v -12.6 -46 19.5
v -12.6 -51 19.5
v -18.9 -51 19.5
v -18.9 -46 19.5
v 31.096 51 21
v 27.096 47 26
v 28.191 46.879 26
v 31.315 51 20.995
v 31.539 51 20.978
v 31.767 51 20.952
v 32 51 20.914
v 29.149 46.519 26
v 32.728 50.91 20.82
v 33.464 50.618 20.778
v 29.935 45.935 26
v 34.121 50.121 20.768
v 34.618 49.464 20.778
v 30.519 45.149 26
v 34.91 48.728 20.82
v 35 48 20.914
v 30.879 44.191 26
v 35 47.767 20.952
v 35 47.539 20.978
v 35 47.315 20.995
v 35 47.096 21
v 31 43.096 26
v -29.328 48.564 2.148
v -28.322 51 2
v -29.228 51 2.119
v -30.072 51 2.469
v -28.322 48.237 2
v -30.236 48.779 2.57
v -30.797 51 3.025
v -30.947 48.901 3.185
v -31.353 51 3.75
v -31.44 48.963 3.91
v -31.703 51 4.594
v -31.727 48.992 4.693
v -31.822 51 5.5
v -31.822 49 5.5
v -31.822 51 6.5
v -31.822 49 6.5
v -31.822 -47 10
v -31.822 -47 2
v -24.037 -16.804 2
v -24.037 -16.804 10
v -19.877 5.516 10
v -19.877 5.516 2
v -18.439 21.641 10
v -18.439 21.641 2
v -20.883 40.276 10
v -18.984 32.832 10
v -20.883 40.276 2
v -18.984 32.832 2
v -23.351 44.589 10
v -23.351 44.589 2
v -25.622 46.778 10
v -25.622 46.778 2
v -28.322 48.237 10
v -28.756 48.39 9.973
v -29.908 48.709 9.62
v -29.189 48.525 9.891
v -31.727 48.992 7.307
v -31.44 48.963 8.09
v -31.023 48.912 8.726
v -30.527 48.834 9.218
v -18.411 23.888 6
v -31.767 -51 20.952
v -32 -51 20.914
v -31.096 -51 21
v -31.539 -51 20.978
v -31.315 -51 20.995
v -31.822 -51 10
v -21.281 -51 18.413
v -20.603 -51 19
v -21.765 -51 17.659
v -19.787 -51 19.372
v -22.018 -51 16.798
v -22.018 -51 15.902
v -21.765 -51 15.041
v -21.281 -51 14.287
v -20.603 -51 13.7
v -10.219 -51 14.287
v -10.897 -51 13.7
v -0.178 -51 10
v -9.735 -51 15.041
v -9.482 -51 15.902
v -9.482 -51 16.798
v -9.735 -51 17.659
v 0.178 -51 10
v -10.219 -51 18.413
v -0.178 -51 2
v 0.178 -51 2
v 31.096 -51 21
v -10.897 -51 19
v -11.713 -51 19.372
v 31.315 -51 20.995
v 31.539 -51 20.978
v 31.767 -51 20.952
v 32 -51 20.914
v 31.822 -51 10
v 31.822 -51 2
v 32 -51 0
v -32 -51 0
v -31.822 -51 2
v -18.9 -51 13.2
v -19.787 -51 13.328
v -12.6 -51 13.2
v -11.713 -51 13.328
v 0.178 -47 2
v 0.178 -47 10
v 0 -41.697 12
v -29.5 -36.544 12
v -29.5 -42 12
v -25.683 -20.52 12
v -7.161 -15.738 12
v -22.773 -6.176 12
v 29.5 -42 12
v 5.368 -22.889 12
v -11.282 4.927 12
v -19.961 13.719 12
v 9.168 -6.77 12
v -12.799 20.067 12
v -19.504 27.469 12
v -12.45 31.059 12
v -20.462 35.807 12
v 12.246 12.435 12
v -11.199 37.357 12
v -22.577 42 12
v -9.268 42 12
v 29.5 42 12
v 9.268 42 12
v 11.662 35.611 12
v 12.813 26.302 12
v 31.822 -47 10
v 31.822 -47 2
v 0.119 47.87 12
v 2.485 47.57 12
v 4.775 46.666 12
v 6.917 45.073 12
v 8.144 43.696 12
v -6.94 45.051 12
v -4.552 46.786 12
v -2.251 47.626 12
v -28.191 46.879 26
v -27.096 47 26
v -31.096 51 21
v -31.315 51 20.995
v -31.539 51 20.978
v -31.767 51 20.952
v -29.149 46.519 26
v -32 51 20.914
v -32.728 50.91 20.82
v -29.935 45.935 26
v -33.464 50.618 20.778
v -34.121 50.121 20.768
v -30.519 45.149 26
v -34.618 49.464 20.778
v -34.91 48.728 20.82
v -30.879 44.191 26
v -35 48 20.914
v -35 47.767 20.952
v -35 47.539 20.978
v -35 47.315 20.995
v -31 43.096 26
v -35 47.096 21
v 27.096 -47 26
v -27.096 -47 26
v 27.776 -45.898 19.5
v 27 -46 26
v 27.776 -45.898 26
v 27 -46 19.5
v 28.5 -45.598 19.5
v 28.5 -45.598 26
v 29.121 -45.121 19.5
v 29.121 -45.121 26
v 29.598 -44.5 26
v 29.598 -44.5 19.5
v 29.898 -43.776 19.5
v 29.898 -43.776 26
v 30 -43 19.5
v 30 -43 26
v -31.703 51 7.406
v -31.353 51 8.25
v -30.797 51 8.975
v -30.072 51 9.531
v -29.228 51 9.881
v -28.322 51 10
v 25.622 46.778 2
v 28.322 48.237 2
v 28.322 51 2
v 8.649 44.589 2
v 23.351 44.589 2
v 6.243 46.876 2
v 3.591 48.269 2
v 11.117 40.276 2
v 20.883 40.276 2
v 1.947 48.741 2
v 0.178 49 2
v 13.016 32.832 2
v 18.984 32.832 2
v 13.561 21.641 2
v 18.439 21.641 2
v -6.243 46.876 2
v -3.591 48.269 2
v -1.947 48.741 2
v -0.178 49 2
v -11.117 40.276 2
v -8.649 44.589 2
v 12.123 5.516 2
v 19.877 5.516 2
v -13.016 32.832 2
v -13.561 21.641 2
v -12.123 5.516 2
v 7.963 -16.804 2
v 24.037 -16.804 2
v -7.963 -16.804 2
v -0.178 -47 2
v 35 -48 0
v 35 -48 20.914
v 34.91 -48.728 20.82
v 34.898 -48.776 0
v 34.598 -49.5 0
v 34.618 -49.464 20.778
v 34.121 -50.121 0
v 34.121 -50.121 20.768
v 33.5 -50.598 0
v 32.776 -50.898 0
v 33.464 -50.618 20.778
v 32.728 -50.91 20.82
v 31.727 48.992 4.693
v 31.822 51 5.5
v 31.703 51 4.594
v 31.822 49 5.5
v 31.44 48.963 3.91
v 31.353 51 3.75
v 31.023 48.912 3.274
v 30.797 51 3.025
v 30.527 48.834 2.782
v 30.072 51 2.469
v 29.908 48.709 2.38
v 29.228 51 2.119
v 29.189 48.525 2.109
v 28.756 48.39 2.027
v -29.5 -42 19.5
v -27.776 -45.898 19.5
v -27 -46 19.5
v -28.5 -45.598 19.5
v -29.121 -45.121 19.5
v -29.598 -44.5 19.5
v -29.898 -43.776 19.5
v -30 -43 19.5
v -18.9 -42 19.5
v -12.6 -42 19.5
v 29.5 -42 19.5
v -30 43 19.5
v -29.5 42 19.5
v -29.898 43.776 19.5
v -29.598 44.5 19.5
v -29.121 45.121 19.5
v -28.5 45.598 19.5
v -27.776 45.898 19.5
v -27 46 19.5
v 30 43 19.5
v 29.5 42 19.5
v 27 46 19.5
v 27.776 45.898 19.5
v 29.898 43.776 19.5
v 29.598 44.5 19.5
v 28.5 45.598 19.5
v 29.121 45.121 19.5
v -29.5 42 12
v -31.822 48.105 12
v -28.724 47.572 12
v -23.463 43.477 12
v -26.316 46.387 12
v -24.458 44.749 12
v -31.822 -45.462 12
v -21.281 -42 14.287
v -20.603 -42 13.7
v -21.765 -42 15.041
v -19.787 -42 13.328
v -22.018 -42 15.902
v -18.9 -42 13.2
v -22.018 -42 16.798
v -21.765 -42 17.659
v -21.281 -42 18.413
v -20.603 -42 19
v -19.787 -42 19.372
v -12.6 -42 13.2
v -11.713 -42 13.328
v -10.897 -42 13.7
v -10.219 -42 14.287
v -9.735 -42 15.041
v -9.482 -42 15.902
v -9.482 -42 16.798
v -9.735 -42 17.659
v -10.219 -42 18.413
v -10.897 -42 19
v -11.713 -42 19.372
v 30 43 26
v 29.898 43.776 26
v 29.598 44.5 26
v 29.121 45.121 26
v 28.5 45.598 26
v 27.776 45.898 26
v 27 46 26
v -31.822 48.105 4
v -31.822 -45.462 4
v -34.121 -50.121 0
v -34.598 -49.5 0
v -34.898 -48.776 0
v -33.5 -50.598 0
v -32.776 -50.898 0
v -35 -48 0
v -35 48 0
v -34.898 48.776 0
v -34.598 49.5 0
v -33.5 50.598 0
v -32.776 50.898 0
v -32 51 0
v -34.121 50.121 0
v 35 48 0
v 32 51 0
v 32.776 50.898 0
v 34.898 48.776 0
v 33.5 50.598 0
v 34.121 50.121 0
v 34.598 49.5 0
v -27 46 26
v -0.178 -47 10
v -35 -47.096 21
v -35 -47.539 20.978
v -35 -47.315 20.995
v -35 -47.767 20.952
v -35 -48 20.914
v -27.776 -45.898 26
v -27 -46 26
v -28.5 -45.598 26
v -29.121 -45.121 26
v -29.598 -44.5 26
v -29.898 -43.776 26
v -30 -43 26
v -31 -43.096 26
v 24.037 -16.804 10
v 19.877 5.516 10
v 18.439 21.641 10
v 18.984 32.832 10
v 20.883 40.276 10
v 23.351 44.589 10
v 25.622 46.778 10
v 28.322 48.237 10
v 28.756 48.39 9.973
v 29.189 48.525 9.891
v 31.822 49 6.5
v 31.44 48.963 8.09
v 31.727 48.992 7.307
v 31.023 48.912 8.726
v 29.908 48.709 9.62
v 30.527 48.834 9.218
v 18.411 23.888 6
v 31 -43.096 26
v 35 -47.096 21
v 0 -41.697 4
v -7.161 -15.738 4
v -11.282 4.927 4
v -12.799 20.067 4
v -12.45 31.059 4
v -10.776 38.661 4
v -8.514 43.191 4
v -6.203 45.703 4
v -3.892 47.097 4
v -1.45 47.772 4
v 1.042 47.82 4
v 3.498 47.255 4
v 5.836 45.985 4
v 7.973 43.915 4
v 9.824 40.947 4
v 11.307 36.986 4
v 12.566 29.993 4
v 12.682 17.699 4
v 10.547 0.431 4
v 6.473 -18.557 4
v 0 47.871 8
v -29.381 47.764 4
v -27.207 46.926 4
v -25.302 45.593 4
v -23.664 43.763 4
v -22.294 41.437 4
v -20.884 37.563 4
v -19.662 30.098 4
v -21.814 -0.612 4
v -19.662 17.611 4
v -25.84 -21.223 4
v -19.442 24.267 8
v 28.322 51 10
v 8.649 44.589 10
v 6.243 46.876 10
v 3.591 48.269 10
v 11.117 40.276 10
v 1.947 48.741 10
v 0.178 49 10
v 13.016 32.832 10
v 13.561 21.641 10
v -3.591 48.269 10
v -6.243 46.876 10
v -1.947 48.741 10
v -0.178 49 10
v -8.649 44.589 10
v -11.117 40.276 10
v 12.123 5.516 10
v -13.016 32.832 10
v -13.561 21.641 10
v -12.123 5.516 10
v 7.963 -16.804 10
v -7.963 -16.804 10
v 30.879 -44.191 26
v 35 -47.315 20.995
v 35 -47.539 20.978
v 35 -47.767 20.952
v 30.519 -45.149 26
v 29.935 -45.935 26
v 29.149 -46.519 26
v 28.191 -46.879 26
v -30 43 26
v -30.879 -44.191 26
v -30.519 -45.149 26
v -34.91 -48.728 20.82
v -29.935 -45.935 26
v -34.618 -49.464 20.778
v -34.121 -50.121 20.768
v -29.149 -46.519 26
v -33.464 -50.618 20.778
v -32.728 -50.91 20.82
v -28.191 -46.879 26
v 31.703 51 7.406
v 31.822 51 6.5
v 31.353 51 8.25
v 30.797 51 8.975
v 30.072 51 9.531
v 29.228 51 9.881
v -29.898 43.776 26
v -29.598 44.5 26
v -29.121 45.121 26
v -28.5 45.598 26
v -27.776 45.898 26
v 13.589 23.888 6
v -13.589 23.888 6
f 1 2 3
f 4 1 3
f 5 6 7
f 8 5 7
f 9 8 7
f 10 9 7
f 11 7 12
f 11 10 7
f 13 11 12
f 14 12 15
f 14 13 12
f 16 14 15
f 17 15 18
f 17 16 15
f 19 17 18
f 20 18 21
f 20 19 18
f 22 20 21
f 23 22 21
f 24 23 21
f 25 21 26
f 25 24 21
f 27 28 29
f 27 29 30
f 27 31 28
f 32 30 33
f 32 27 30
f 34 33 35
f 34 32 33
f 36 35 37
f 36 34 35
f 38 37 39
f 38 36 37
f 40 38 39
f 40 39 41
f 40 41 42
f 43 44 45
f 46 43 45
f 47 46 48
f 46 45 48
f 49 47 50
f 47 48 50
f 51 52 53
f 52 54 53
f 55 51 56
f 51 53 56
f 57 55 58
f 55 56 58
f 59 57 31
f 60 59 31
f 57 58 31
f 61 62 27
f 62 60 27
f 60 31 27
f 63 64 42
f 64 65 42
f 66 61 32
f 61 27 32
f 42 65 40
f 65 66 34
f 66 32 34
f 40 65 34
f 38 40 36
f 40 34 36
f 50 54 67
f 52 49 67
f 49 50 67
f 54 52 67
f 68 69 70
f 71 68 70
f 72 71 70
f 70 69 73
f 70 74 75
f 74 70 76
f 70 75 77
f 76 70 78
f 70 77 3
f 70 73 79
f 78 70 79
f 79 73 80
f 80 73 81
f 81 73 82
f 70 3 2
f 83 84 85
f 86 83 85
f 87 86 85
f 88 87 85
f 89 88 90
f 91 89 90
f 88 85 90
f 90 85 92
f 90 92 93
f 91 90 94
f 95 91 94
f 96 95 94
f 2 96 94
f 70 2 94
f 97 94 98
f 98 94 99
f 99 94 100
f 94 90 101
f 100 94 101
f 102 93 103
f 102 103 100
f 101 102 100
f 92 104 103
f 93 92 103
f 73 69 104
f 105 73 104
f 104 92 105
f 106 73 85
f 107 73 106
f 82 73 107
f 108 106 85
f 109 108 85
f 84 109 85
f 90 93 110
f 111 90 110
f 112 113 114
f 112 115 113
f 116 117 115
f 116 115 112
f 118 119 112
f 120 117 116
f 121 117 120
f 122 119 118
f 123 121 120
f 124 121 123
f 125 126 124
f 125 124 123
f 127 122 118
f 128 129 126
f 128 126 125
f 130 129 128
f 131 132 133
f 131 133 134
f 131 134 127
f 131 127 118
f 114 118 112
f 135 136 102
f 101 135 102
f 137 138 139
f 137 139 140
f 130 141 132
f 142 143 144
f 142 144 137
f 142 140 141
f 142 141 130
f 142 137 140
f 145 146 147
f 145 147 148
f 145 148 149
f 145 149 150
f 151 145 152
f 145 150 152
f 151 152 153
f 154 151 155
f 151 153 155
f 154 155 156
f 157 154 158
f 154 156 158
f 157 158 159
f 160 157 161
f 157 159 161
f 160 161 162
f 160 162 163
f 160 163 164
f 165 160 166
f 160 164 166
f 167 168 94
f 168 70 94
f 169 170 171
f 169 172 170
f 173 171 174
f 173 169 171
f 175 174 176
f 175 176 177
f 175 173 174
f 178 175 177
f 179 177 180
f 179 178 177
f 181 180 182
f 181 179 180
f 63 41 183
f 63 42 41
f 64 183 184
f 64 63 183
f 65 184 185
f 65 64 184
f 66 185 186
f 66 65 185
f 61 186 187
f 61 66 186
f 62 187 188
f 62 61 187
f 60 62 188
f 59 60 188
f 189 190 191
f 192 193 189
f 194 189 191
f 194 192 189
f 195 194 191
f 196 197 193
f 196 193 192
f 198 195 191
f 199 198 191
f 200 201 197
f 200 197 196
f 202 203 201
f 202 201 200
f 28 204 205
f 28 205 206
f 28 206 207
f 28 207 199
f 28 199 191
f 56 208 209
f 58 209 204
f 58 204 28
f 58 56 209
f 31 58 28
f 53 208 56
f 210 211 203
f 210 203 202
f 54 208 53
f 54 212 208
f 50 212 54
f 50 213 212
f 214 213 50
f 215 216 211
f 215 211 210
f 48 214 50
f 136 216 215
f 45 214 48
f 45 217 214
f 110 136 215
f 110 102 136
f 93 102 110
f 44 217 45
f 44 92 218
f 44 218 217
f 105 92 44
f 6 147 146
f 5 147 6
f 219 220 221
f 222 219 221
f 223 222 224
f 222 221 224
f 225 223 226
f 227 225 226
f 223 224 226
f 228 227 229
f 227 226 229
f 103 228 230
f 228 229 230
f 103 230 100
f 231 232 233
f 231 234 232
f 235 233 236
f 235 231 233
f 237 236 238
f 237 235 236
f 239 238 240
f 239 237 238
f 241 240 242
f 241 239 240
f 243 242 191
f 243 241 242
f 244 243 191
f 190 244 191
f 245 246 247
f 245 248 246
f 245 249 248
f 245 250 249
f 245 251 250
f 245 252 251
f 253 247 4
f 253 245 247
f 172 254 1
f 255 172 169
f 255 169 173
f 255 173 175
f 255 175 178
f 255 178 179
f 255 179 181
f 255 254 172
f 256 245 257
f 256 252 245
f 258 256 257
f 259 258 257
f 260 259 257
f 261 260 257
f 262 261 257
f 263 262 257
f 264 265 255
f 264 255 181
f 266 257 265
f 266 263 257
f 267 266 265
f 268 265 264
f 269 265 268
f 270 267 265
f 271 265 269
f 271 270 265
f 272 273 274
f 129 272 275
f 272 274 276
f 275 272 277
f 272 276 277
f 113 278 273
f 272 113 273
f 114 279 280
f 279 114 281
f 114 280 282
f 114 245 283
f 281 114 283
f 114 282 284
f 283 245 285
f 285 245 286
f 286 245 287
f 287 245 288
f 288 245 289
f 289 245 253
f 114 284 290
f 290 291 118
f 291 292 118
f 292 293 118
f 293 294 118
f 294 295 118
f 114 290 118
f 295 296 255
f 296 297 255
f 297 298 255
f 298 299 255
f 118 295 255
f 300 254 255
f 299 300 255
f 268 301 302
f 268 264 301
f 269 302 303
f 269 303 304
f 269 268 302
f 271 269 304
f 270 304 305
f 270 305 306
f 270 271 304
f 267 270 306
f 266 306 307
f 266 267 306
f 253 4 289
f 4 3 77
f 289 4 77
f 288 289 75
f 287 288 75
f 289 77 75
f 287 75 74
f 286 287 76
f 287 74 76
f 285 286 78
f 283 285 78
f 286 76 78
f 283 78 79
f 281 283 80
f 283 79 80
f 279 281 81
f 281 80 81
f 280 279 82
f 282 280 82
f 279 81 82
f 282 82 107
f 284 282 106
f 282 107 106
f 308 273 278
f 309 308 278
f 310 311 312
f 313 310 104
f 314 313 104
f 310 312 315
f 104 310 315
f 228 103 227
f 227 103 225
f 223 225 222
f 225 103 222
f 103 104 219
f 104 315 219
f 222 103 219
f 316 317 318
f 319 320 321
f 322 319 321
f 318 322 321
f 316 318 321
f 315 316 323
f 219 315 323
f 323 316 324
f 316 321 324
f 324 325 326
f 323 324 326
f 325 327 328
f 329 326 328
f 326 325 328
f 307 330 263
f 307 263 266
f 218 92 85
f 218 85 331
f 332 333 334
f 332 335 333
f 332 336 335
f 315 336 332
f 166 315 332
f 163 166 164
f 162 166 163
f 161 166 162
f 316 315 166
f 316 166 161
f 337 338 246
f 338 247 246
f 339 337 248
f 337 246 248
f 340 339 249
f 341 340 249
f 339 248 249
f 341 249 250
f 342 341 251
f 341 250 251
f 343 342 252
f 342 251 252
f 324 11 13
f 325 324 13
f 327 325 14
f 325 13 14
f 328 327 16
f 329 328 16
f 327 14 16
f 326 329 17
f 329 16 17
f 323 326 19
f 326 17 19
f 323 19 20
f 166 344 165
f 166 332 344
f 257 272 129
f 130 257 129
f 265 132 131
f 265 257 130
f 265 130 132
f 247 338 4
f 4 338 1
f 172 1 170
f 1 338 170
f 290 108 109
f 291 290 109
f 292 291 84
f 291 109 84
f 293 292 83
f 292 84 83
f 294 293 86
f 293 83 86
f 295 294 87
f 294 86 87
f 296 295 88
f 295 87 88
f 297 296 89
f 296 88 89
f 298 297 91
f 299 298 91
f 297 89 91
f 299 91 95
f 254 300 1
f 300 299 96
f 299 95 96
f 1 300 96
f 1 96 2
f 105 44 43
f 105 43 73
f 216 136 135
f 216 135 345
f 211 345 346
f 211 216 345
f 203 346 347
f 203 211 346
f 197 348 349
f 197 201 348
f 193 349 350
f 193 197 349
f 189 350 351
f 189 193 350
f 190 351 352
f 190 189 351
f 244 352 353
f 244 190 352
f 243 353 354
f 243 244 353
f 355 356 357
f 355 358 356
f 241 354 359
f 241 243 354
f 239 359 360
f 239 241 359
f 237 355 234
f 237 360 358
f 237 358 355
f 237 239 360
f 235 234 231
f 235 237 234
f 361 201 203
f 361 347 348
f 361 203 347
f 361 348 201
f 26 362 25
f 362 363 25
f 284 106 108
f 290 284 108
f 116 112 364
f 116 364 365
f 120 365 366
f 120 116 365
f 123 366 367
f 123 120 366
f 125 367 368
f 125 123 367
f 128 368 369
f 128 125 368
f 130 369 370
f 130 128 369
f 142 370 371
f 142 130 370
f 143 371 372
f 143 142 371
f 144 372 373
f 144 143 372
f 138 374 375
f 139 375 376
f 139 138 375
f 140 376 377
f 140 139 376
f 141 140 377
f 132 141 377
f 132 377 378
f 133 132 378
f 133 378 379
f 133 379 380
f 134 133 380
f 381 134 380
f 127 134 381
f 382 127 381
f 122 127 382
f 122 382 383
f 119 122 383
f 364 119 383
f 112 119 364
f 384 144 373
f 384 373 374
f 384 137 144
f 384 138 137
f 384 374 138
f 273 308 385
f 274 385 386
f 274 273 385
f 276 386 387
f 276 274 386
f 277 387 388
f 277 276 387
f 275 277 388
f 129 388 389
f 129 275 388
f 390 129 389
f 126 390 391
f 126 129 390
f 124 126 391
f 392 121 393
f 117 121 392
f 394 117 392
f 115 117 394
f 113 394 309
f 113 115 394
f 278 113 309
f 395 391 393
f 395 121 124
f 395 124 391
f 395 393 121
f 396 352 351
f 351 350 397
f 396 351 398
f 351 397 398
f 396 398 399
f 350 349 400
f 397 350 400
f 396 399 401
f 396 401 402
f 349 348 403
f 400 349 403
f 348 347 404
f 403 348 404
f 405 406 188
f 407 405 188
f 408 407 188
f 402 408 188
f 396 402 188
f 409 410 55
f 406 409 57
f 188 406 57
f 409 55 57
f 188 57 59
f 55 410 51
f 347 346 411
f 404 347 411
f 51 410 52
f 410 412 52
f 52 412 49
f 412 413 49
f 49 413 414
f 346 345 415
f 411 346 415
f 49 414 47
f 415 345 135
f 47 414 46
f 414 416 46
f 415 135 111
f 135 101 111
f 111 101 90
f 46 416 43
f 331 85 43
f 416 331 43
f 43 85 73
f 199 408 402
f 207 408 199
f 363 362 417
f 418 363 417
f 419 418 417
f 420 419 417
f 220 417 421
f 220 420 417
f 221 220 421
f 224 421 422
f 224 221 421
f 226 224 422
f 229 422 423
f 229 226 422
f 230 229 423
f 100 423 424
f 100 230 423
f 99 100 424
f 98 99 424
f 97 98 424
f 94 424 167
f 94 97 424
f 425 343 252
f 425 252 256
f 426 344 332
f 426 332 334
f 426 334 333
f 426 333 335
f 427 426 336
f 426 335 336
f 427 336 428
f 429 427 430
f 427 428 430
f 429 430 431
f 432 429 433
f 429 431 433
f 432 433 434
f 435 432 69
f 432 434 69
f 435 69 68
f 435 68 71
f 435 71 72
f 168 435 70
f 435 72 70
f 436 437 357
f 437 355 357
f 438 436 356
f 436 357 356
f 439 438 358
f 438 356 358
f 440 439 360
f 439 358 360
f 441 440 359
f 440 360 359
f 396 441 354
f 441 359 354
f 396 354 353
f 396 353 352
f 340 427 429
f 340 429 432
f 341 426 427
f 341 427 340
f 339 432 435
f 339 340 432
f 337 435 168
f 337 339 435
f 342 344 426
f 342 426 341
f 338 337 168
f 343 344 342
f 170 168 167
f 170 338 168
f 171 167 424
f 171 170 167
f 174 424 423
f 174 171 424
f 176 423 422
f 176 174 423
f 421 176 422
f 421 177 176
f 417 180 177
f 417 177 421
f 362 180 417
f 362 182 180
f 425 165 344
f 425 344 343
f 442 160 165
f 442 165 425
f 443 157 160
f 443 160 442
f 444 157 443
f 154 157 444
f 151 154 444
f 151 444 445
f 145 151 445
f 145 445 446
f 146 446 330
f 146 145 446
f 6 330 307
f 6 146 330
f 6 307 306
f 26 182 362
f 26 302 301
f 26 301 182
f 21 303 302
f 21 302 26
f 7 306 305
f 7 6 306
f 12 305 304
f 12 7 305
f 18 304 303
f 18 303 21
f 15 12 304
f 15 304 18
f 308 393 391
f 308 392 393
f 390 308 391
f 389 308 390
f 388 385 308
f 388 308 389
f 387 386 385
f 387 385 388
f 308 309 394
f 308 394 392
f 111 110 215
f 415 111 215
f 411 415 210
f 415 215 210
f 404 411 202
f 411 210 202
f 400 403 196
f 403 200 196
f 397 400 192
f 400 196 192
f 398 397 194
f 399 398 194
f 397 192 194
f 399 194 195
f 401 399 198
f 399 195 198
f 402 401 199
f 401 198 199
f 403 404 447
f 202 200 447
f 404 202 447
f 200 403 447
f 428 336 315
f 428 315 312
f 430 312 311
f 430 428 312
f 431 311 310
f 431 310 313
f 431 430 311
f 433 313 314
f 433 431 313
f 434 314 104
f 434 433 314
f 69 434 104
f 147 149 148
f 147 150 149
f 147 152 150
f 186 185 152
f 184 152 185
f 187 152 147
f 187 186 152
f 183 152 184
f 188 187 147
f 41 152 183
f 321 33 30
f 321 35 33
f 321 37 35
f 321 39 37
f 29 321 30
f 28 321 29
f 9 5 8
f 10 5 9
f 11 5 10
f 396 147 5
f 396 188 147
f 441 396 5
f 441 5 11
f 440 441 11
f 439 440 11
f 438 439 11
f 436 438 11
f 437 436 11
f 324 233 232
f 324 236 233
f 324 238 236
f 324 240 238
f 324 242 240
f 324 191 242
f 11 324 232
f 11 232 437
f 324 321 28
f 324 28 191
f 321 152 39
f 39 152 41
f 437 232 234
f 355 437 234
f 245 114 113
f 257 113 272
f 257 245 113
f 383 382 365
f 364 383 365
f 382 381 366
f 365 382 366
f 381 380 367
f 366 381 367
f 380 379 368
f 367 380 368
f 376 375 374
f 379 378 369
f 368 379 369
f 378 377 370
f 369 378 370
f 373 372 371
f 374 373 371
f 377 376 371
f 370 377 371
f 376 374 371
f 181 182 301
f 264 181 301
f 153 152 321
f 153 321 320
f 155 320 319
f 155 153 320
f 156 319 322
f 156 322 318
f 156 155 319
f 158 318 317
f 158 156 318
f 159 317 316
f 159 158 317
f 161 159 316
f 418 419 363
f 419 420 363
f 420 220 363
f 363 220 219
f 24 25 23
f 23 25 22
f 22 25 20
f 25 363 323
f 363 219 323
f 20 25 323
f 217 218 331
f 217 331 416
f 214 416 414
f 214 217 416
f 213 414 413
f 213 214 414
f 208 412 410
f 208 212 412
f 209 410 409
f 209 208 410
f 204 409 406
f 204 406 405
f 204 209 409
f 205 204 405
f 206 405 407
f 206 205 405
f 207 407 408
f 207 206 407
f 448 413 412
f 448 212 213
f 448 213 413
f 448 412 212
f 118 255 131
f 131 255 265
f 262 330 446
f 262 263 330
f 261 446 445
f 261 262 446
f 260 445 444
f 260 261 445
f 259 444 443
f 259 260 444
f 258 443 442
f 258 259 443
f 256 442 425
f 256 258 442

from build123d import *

# Parameters (mm, degrees)
SKETCH016_W        = 70
SKETCH016_H        = 102
PAD007_DEPTH       = 26
SKETCH017_W        = 60
SKETCH017_H        = 92
POCKET011_DEPTH    = 6.5
FILLET010_R        = 3
SKETCH018_W        = 59
SKETCH018_H        = 84
POCKET012_DEPTH    = 7.5
POCKET013_DEPTH    = 9
POCKET014_DEPTH    = 8
POCKET015_DEPTH    = 8
CHAMFER007_SIZE2   = 5
CHAMFER007_SIZE    = 4
FILLET011_R        = 5
FILLET012_R        = 3
POCKET015_FACE20_W = 2
POCKET015_FACE20_H = 8
POCKET016_DEPTH    = 0.356442
FILLET013_R        = 3.5


with BuildPart() as part:
    # Sketch016 → Pad007 (new body)
    with BuildSketch(Plane.XY):
        Rectangle(SKETCH016_W, SKETCH016_H)
    extrude(amount=PAD007_DEPTH)

    # Sketch017 (on Face6 of Pad007) → Pocket011 (cut)
    with BuildSketch(Plane.XY.offset(26)):
        Rectangle(SKETCH017_W, SKETCH017_H)
    extrude(amount=-POCKET011_DEPTH, mode=Mode.SUBTRACT)

    # Fillet010
    fillet010_edges = [part.edges().sort_by_distance(p)[0] for p in [
        (30, 46, 22.75),
        (-30, 46, 22.75),
        (-30, -46, 22.75),
        (30, -46, 22.75),
    ]]
    fillet(fillet010_edges, radius=FILLET010_R)

    # Sketch018 (on Face11 of Pocket011) → Pocket012 (cut)
    with BuildSketch(Plane.XY.offset(19.5)):
        Rectangle(SKETCH018_W, SKETCH018_H)
    extrude(amount=-POCKET012_DEPTH, mode=Mode.SUBTRACT)

    # Sketch019 (on Face13 of Pocket012) → Pocket013 (cut)
    with BuildSketch(Plane.XZ.offset(51)):
        with BuildLine():
            ThreePointArc((-18.9, 19.5), (-22.05, 16.35), (-18.9, 13.2))
            Line((-18.9, 13.2), (-12.6, 13.2))
            ThreePointArc((-12.6, 13.2), (-9.45, 16.35), (-12.6, 19.5))
            Line((-12.6, 19.5), (-18.9, 19.5))
        make_face()
    extrude(amount=-POCKET013_DEPTH, mode=Mode.SUBTRACT)

    # Sketch020 (on DatumPlane) → Pocket014 (cut)
    with BuildSketch(Plane(origin=(0, 0, 2), x_dir=(1, 0, 0), z_dir=(0, 0, -1))):
        with BuildLine():
            Line((-31.821779, 47), (-31.821779, 51))
            Line((-31.821779, 51), (-0.178221, 51))
            Line((-0.178221, 51), (-0.178221, 47))
            add(Edge.make_bspline(
                [(-0.178221, 47), (-27, -46.775214), (-0.178221, -49)],
                knots=[0, 0, 0, 1, 1, 1], degree=2))
            Line((-0.178221, -49), (-0.178221, -51))
            Line((-0.178221, -51), (-31.821779, -51))
            Line((-31.821779, -51), (-31.821779, -49))
            add(Edge.make_bspline(
                [(-31.821779, 47), (-5, -46.775214), (-31.821779, -49)],
                knots=[0, 0, 0, 1, 1, 1], degree=2))
        make_face()
        with BuildLine():
            Line((31.821779, 47), (31.821779, 51))
            Line((31.821779, 51), (0.178221, 51))
            Line((0.178221, 51), (0.178221, 47))
            add(Edge.make_bspline(
                [(0.178221, 47), (27, -46.775214), (0.178221, -49)],
                knots=[0, 0, 0, 1, 1, 1], degree=2))
            Line((0.178221, -49), (0.178221, -51))
            Line((0.178221, -51), (31.821779, -51))
            Line((31.821779, -51), (31.821779, -49))
            add(Edge.make_bspline(
                [(31.821779, 47), (5, -46.775214), (31.821779, -49)],
                knots=[0, 0, 0, 1, 1, 1], degree=2))
        make_face()
    extrude(amount=-POCKET014_DEPTH, mode=Mode.SUBTRACT)

    # Sketch021 (on DatumPlane) → Pocket015 (cut)
    with BuildSketch(Plane.XY.offset(12)):
        with BuildLine():
            add(Edge.make_bspline(
                [(0, -41.6971), (-22.282957, 30.899597), (0, 64.842011), (22.282957, 30.899597), (0, -41.6971)],
                knots=[0, 0, 0, 0, 0.5, 1, 1, 1, 1], degree=3))
        make_face()
        with BuildLine():
            Line((-31.821779, 48.104515), (-31.821779, -45.461681))
            add(Edge.make_bspline(
                [(-31.821779, 48.104515), (-7.061375, 47.212971), (-31.821779, -45.461681)],
                knots=[0, 0, 0, 1, 1, 1], degree=2))
        make_face()
    extrude(amount=-POCKET015_DEPTH, mode=Mode.SUBTRACT)

    # Chamfer007
    chamfer007_edges = [part.edges().sort_by_distance(p)[0] for p in [
        (0, 51, 26),
        (-35, 0, 26),
        (35, 0, 26),
        (0, -51, 26),
    ]]
    chamfer007_side = part.faces().sort_by_distance((-31.237093, 0, 26))[0]
    chamfer(chamfer007_edges, length=CHAMFER007_SIZE, length2=CHAMFER007_SIZE2, reference=chamfer007_side)

    # Fillet011
    fillet011_edges = [part.edges().sort_by_distance(p)[0] for p in [
        (-33, -49, 23.5),
        (-33, 49, 23.5),
        (33, -49, 23.5),
        (33, 49, 23.5),
    ]]
    fillet(fillet011_edges, radius=FILLET011_R)

    # Fillet012
    fillet012_edges = [part.edges().sort_by_distance(p)[0] for p in [
        (35, 51, 9.834634),
        (-35, 51, 9.834634),
        (-35, -51, 9.834634),
        (35, -51, 9.834634),
    ]]
    fillet(fillet012_edges, radius=FILLET012_R)

    # Pocket015 Face20 → Pocket016 (cut)
    with BuildSketch(Plane(origin=(-0.178221, 50, 6), x_dir=(0, 1, 0), z_dir=(-1, 0, 0))):
        Rectangle(POCKET015_FACE20_W, POCKET015_FACE20_H)
    extrude(amount=-POCKET016_DEPTH, mode=Mode.SUBTRACT)

    # Fillet013
    fillet013_edges = [part.edges().sort_by_distance(p)[0] for p in [
        (-31.821779, 50, 10),
        (31.821779, 50, 10),
        (-31.821779, 50, 2),
        (31.821779, 50, 2),
    ]]
    fillet(fillet013_edges, radius=FILLET013_R)


solid = part.part
